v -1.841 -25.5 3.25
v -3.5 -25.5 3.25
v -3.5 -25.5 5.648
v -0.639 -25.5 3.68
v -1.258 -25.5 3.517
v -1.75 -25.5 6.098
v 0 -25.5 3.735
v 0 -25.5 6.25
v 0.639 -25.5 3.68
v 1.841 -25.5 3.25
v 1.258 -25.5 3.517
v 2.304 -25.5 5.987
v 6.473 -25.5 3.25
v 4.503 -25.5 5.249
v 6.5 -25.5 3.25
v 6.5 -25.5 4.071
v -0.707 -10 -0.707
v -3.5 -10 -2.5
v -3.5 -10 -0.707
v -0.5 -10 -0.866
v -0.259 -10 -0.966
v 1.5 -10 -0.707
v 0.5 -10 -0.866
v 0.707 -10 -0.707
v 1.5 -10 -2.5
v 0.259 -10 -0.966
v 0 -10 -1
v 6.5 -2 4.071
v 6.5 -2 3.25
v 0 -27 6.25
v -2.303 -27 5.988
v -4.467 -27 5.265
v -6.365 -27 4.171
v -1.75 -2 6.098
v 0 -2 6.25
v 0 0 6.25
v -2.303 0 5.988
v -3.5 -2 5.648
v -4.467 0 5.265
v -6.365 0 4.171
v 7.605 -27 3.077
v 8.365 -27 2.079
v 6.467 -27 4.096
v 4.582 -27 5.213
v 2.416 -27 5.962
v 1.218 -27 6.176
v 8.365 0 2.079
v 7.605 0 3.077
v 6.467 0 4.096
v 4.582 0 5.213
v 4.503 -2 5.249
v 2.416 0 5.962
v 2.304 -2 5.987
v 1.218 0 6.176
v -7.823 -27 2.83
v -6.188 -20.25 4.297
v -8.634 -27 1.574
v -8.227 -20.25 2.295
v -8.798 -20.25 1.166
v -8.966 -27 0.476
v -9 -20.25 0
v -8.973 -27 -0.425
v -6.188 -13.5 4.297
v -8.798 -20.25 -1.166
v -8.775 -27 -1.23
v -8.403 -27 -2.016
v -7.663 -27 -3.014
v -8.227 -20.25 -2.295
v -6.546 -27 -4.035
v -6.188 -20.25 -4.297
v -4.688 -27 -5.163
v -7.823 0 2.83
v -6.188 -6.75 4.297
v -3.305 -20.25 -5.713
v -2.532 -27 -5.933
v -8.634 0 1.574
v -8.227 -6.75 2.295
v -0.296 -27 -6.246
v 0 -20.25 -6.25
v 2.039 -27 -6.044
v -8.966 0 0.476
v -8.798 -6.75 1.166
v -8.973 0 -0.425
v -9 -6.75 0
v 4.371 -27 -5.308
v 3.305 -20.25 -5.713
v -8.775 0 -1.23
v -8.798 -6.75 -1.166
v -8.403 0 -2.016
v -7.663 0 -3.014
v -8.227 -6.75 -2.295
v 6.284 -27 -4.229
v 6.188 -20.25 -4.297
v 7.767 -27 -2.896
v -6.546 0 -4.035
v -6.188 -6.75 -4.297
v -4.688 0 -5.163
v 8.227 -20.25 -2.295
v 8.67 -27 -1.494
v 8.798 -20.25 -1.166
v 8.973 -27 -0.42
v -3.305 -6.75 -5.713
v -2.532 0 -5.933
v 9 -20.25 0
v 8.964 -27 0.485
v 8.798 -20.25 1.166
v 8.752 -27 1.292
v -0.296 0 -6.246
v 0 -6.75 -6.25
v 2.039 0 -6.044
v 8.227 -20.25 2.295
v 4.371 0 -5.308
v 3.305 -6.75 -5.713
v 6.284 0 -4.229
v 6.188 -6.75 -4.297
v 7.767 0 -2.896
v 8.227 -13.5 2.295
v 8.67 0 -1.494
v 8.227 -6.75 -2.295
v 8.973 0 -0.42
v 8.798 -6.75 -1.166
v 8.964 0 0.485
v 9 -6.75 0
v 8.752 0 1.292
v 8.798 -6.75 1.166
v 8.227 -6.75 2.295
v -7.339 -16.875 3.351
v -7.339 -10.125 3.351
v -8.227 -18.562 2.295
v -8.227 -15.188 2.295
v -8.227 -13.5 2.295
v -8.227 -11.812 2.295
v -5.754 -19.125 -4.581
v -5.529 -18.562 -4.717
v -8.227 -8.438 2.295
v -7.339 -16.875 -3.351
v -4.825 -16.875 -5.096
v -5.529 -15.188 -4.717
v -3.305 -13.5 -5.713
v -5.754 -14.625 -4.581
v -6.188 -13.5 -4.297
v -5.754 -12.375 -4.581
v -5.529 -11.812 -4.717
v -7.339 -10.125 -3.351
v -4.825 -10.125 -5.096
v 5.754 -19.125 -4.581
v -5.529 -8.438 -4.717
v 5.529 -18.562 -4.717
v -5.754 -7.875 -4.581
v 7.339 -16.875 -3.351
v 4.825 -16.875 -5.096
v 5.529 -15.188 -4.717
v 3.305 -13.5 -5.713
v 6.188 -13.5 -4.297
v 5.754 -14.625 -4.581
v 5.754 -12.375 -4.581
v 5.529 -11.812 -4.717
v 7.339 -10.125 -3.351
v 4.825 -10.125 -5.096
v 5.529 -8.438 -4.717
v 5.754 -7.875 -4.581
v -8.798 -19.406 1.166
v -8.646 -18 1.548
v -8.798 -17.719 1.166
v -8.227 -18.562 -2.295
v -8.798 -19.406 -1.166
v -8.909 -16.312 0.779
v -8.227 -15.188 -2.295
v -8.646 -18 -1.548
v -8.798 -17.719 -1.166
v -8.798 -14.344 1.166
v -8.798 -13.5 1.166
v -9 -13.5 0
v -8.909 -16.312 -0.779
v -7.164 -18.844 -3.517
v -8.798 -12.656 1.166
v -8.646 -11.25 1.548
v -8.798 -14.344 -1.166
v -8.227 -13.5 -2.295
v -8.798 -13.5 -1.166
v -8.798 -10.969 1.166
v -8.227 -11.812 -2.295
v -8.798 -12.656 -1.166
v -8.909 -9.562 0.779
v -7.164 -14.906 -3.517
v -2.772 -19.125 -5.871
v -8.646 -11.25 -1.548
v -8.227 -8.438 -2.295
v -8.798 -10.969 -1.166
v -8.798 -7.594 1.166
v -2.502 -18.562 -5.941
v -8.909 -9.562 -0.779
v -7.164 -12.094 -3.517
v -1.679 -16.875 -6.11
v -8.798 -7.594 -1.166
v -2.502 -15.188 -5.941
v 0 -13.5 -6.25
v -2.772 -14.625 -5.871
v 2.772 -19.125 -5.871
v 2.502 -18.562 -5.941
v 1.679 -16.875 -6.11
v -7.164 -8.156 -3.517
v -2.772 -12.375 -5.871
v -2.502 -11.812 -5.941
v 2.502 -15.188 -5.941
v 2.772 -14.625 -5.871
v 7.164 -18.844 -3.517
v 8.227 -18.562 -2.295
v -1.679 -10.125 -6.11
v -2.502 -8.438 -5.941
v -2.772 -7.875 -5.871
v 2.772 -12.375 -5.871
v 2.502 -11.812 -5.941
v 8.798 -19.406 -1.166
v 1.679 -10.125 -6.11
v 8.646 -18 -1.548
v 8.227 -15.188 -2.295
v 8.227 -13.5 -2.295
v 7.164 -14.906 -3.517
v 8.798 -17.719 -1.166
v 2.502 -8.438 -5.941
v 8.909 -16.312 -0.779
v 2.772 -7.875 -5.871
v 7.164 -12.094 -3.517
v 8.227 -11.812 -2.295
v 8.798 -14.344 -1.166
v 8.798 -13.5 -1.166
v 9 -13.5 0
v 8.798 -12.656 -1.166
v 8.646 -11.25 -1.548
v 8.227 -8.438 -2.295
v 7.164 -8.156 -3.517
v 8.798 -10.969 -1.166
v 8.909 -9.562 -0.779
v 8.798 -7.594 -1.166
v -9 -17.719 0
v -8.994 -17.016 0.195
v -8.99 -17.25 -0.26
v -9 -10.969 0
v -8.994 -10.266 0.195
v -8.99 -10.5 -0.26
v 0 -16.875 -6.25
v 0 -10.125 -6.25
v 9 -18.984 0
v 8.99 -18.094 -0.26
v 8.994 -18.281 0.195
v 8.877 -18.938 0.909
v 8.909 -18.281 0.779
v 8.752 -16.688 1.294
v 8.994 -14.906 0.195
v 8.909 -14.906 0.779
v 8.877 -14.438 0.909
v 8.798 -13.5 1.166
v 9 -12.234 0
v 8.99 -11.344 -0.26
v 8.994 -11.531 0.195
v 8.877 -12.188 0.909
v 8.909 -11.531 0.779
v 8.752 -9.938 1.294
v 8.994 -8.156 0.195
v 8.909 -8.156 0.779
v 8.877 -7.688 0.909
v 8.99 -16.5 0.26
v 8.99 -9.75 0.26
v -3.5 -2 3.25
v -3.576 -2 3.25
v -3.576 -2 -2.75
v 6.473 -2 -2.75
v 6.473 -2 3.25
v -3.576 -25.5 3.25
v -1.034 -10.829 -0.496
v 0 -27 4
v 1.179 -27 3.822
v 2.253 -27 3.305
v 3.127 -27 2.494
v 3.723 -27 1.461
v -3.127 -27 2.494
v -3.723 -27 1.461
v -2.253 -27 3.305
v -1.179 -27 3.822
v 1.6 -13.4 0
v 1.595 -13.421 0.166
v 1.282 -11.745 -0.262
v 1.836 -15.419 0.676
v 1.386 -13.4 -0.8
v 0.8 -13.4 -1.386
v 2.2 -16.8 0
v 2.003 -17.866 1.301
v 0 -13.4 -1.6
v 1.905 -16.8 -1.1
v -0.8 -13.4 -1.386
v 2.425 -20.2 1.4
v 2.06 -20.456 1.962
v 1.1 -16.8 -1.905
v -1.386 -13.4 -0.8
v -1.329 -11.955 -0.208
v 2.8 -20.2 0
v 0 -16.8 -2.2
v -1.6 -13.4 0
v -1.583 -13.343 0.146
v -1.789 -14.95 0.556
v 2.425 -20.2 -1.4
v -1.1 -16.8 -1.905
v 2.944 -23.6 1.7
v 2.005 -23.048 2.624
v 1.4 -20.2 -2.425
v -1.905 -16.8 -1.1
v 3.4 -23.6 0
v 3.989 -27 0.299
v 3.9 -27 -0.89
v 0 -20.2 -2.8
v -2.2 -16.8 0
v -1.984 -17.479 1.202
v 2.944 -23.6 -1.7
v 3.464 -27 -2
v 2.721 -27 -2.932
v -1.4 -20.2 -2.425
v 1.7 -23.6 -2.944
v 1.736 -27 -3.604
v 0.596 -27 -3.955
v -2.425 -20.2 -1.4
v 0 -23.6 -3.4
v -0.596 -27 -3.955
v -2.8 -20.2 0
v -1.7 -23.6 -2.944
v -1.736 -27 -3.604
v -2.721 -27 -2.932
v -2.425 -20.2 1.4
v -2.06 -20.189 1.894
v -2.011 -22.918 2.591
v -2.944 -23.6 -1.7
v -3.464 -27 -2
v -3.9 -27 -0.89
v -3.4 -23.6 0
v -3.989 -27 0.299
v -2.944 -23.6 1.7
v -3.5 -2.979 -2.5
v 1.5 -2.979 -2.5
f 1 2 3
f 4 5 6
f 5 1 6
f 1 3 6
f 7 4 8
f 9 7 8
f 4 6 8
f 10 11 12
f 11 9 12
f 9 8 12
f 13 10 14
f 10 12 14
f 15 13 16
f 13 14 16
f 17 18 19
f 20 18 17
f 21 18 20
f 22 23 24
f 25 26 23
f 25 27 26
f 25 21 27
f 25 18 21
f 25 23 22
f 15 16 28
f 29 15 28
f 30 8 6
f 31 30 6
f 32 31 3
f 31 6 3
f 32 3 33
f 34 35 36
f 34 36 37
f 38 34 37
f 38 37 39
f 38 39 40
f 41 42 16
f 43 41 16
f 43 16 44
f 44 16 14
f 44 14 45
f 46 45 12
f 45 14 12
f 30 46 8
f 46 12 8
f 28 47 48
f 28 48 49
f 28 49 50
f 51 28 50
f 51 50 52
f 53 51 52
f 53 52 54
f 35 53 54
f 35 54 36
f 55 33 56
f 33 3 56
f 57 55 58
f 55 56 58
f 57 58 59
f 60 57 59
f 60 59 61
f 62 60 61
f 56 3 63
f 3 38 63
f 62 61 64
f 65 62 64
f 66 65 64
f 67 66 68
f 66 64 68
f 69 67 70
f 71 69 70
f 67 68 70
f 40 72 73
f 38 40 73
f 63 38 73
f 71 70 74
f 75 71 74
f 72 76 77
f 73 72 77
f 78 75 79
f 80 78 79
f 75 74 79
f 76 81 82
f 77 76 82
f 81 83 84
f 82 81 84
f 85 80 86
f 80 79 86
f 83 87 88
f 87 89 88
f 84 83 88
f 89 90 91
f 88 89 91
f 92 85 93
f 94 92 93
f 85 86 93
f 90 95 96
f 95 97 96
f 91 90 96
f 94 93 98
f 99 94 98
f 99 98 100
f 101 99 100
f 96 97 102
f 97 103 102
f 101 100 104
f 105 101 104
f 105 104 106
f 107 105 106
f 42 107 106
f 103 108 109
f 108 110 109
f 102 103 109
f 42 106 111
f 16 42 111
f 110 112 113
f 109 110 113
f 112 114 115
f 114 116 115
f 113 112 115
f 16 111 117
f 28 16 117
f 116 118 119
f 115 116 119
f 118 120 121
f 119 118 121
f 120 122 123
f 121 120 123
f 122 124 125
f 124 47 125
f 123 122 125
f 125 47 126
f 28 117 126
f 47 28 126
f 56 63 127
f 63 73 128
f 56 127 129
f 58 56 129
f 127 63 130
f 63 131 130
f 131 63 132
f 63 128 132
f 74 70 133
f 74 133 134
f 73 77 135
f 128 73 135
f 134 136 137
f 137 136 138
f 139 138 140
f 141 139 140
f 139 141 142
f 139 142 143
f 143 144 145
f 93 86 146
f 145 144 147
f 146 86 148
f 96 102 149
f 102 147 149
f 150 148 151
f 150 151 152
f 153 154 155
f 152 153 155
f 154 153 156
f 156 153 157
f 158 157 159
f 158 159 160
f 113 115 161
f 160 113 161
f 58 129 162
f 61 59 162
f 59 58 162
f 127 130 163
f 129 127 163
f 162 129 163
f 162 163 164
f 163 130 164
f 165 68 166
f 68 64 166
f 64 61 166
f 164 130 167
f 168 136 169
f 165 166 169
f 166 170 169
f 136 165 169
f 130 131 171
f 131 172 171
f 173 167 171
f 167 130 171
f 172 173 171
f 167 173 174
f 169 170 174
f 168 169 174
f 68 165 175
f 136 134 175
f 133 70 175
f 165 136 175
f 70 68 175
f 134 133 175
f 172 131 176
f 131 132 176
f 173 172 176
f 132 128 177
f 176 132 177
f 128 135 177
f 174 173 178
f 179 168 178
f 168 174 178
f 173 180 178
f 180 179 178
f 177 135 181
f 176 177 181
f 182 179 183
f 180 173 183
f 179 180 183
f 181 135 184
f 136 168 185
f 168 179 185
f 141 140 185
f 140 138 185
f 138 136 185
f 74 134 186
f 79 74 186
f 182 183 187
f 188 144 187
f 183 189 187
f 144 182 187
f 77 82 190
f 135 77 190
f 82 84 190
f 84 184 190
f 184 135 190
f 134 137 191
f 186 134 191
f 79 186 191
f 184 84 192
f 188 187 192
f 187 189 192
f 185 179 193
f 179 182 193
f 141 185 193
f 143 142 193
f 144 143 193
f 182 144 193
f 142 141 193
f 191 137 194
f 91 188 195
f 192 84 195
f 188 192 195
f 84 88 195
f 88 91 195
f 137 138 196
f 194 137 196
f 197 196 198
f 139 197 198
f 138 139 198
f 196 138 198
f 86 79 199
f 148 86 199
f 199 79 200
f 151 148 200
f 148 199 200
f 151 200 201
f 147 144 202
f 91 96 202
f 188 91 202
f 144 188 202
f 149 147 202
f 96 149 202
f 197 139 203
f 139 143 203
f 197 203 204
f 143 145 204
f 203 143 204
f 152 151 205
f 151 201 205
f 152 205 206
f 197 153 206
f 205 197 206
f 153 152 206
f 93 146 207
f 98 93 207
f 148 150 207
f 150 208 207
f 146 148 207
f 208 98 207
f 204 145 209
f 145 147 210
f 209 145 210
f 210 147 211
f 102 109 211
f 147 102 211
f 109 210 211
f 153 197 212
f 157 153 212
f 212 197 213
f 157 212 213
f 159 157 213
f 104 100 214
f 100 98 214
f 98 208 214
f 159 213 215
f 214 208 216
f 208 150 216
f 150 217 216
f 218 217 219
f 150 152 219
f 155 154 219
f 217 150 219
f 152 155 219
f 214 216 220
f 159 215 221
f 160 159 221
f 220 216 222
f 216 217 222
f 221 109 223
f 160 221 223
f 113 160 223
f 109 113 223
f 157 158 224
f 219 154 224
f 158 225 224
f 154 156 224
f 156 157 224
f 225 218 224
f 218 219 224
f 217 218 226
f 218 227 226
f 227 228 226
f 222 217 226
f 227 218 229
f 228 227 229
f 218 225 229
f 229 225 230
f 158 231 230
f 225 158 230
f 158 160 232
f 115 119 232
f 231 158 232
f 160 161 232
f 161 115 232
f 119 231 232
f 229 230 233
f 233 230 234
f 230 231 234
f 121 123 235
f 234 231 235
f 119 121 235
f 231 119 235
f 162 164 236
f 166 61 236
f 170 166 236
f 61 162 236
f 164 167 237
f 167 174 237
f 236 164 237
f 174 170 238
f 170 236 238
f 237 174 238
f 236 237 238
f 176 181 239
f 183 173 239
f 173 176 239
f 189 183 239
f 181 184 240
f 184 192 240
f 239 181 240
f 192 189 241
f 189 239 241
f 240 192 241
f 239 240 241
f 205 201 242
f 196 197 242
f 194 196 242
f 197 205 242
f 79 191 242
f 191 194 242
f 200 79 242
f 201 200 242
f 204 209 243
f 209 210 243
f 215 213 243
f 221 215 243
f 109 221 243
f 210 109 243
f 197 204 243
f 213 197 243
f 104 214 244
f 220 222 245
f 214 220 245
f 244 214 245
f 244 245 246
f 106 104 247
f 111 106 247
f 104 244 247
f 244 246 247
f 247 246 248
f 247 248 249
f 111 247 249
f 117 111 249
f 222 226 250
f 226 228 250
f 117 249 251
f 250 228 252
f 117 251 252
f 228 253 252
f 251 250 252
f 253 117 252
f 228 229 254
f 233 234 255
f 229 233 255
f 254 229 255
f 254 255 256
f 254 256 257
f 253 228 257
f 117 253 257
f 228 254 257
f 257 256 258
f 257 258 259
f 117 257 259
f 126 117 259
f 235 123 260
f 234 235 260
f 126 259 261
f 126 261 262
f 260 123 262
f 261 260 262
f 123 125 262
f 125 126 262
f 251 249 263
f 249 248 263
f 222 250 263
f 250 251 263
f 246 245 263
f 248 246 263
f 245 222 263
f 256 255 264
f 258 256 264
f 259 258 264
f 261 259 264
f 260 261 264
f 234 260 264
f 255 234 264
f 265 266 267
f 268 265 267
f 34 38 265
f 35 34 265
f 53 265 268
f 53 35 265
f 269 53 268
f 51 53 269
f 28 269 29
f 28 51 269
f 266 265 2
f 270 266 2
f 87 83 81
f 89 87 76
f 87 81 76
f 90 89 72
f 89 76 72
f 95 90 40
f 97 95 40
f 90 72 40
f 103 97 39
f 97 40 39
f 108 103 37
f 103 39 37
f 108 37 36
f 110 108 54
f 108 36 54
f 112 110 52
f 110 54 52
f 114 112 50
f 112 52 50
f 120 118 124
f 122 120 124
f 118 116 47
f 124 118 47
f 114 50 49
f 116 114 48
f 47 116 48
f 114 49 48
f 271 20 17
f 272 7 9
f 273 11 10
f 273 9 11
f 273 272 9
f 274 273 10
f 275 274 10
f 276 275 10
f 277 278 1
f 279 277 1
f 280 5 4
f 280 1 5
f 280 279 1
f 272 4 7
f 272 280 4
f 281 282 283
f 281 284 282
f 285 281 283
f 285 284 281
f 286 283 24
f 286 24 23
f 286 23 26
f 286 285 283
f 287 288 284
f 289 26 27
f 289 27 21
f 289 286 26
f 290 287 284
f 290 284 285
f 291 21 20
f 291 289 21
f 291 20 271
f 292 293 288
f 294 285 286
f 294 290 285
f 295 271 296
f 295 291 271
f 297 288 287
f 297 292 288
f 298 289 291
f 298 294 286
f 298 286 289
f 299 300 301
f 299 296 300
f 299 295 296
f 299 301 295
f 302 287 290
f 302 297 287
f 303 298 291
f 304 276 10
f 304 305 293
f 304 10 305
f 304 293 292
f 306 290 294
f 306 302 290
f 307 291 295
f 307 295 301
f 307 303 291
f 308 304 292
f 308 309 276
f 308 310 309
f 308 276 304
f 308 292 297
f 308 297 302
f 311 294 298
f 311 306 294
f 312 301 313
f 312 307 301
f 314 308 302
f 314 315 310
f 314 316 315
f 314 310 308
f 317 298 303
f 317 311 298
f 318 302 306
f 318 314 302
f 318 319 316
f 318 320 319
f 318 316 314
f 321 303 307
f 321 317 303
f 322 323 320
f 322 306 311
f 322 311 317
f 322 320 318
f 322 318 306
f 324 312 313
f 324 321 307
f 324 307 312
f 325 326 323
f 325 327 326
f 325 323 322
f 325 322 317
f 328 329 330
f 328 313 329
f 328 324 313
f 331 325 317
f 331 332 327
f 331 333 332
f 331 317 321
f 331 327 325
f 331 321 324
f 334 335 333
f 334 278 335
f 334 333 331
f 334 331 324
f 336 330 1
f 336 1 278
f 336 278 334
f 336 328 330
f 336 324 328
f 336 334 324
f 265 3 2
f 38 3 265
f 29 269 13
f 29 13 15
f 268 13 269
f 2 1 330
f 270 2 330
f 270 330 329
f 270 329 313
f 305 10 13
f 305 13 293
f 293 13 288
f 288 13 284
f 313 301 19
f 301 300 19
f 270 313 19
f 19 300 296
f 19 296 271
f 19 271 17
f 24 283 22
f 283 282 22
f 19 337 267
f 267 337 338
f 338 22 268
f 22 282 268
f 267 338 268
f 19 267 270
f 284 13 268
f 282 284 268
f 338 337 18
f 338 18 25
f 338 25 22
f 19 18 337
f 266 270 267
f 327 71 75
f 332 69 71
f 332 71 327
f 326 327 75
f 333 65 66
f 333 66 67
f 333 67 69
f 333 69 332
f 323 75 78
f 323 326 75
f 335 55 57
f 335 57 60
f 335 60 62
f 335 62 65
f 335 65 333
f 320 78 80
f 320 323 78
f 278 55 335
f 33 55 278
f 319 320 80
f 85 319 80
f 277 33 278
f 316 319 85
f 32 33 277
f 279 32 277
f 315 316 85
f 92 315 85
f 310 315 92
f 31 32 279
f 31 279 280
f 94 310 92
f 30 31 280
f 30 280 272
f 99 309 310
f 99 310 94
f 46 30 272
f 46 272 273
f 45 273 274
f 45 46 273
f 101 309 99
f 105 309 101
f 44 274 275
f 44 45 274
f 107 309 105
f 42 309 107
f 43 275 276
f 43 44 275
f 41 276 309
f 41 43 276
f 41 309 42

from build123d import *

# Parameters (mm, degrees)
F1_DEPTH       = 27
F3_W           = 10
F3_H           = 23.5
F4_DEPTH       = 3
F9_W           = 5
F9_H           = 8
F10_DEPTH      = 4
F11_DEPTH      = 4
F13_DEPTH      = 9.82609
F13_DEPTH_BACK = 0.22331


with BuildPart() as f1:
    # F0 (on Front) → F1 (new body)
    with BuildSketch(Plane.XZ):
        with BuildLine():
            add(Edge.make_bspline(
                [(-9, 0), (-9, -3.125), (-4.5, -6.25), (0, -6.25)],
                knots=[0.5, 0.5, 0.5, 0.5, 0.75, 0.75, 0.75, 0.75], degree=3))
            add(Edge.make_bspline(
                [(0, -6.25), (4.5, -6.25), (9, -3.125), (9, 0)],
                knots=[0.75, 0.75, 0.75, 0.75, 1, 1, 1, 1], degree=3))
            add(Edge.make_bspline(
                [(9, 0), (9, 3.125), (4.5, 6.25), (0, 6.25)],
                knots=[0, 0, 0, 0, 0.25, 0.25, 0.25, 0.25], degree=3))
            add(Edge.make_bspline(
                [(0, 6.25), (-4.5, 6.25), (-9, 3.125), (-9, 0)],
                knots=[0.25, 0.25, 0.25, 0.25, 0.5, 0.5, 0.5, 0.5], degree=3))
        make_face()
    extrude(amount=F1_DEPTH)

    # F3 (on offset) → F4 (cut)
    with BuildSketch(Plane.XY.offset(6.25)):
        with Locations((1.5, -13.75)):
            Rectangle(F3_W, F3_H)
    extrude(amount=-F4_DEPTH, mode=Mode.SUBTRACT)

    # F6 (on Right) → F7 (revolve, cut)
    with BuildSketch(Plane.YZ):
        Polygon((-27, 4), (-27, 0), (-10, 0), (-10, 1), align=None)
    revolve(axis=Axis((0, -18.5, 0), (0, 1, 0)), mode=Mode.SUBTRACT)

    # F9 (on offset) → F10 (cut)
    with BuildSketch(Plane.XY.offset(-2.5)):
        with Locations((-1, -6)):
            Rectangle(F9_W, F9_H)
    extrude(amount=F10_DEPTH, mode=Mode.SUBTRACT)

    # F9 (on offset) → F11 (cut)
    with BuildSketch(Plane.XY.offset(-2.5)):
        with Locations((-1, -6)):
            Rectangle(F9_W, F9_H)
    extrude(amount=F11_DEPTH, mode=Mode.SUBTRACT)

    # F12 (on offset) → F13 (cut, two sides)
    with BuildSketch(Plane.YZ.offset(6.25)) as f13_sk:
        Polygon((-2, -2.75), (-2, 3.25), (-25.5, 3.25), align=None)
    extrude(amount=-F13_DEPTH, mode=Mode.SUBTRACT)
    extrude(f13_sk.sketch, amount=F13_DEPTH_BACK, mode=Mode.SUBTRACT)


solid = f1.part
